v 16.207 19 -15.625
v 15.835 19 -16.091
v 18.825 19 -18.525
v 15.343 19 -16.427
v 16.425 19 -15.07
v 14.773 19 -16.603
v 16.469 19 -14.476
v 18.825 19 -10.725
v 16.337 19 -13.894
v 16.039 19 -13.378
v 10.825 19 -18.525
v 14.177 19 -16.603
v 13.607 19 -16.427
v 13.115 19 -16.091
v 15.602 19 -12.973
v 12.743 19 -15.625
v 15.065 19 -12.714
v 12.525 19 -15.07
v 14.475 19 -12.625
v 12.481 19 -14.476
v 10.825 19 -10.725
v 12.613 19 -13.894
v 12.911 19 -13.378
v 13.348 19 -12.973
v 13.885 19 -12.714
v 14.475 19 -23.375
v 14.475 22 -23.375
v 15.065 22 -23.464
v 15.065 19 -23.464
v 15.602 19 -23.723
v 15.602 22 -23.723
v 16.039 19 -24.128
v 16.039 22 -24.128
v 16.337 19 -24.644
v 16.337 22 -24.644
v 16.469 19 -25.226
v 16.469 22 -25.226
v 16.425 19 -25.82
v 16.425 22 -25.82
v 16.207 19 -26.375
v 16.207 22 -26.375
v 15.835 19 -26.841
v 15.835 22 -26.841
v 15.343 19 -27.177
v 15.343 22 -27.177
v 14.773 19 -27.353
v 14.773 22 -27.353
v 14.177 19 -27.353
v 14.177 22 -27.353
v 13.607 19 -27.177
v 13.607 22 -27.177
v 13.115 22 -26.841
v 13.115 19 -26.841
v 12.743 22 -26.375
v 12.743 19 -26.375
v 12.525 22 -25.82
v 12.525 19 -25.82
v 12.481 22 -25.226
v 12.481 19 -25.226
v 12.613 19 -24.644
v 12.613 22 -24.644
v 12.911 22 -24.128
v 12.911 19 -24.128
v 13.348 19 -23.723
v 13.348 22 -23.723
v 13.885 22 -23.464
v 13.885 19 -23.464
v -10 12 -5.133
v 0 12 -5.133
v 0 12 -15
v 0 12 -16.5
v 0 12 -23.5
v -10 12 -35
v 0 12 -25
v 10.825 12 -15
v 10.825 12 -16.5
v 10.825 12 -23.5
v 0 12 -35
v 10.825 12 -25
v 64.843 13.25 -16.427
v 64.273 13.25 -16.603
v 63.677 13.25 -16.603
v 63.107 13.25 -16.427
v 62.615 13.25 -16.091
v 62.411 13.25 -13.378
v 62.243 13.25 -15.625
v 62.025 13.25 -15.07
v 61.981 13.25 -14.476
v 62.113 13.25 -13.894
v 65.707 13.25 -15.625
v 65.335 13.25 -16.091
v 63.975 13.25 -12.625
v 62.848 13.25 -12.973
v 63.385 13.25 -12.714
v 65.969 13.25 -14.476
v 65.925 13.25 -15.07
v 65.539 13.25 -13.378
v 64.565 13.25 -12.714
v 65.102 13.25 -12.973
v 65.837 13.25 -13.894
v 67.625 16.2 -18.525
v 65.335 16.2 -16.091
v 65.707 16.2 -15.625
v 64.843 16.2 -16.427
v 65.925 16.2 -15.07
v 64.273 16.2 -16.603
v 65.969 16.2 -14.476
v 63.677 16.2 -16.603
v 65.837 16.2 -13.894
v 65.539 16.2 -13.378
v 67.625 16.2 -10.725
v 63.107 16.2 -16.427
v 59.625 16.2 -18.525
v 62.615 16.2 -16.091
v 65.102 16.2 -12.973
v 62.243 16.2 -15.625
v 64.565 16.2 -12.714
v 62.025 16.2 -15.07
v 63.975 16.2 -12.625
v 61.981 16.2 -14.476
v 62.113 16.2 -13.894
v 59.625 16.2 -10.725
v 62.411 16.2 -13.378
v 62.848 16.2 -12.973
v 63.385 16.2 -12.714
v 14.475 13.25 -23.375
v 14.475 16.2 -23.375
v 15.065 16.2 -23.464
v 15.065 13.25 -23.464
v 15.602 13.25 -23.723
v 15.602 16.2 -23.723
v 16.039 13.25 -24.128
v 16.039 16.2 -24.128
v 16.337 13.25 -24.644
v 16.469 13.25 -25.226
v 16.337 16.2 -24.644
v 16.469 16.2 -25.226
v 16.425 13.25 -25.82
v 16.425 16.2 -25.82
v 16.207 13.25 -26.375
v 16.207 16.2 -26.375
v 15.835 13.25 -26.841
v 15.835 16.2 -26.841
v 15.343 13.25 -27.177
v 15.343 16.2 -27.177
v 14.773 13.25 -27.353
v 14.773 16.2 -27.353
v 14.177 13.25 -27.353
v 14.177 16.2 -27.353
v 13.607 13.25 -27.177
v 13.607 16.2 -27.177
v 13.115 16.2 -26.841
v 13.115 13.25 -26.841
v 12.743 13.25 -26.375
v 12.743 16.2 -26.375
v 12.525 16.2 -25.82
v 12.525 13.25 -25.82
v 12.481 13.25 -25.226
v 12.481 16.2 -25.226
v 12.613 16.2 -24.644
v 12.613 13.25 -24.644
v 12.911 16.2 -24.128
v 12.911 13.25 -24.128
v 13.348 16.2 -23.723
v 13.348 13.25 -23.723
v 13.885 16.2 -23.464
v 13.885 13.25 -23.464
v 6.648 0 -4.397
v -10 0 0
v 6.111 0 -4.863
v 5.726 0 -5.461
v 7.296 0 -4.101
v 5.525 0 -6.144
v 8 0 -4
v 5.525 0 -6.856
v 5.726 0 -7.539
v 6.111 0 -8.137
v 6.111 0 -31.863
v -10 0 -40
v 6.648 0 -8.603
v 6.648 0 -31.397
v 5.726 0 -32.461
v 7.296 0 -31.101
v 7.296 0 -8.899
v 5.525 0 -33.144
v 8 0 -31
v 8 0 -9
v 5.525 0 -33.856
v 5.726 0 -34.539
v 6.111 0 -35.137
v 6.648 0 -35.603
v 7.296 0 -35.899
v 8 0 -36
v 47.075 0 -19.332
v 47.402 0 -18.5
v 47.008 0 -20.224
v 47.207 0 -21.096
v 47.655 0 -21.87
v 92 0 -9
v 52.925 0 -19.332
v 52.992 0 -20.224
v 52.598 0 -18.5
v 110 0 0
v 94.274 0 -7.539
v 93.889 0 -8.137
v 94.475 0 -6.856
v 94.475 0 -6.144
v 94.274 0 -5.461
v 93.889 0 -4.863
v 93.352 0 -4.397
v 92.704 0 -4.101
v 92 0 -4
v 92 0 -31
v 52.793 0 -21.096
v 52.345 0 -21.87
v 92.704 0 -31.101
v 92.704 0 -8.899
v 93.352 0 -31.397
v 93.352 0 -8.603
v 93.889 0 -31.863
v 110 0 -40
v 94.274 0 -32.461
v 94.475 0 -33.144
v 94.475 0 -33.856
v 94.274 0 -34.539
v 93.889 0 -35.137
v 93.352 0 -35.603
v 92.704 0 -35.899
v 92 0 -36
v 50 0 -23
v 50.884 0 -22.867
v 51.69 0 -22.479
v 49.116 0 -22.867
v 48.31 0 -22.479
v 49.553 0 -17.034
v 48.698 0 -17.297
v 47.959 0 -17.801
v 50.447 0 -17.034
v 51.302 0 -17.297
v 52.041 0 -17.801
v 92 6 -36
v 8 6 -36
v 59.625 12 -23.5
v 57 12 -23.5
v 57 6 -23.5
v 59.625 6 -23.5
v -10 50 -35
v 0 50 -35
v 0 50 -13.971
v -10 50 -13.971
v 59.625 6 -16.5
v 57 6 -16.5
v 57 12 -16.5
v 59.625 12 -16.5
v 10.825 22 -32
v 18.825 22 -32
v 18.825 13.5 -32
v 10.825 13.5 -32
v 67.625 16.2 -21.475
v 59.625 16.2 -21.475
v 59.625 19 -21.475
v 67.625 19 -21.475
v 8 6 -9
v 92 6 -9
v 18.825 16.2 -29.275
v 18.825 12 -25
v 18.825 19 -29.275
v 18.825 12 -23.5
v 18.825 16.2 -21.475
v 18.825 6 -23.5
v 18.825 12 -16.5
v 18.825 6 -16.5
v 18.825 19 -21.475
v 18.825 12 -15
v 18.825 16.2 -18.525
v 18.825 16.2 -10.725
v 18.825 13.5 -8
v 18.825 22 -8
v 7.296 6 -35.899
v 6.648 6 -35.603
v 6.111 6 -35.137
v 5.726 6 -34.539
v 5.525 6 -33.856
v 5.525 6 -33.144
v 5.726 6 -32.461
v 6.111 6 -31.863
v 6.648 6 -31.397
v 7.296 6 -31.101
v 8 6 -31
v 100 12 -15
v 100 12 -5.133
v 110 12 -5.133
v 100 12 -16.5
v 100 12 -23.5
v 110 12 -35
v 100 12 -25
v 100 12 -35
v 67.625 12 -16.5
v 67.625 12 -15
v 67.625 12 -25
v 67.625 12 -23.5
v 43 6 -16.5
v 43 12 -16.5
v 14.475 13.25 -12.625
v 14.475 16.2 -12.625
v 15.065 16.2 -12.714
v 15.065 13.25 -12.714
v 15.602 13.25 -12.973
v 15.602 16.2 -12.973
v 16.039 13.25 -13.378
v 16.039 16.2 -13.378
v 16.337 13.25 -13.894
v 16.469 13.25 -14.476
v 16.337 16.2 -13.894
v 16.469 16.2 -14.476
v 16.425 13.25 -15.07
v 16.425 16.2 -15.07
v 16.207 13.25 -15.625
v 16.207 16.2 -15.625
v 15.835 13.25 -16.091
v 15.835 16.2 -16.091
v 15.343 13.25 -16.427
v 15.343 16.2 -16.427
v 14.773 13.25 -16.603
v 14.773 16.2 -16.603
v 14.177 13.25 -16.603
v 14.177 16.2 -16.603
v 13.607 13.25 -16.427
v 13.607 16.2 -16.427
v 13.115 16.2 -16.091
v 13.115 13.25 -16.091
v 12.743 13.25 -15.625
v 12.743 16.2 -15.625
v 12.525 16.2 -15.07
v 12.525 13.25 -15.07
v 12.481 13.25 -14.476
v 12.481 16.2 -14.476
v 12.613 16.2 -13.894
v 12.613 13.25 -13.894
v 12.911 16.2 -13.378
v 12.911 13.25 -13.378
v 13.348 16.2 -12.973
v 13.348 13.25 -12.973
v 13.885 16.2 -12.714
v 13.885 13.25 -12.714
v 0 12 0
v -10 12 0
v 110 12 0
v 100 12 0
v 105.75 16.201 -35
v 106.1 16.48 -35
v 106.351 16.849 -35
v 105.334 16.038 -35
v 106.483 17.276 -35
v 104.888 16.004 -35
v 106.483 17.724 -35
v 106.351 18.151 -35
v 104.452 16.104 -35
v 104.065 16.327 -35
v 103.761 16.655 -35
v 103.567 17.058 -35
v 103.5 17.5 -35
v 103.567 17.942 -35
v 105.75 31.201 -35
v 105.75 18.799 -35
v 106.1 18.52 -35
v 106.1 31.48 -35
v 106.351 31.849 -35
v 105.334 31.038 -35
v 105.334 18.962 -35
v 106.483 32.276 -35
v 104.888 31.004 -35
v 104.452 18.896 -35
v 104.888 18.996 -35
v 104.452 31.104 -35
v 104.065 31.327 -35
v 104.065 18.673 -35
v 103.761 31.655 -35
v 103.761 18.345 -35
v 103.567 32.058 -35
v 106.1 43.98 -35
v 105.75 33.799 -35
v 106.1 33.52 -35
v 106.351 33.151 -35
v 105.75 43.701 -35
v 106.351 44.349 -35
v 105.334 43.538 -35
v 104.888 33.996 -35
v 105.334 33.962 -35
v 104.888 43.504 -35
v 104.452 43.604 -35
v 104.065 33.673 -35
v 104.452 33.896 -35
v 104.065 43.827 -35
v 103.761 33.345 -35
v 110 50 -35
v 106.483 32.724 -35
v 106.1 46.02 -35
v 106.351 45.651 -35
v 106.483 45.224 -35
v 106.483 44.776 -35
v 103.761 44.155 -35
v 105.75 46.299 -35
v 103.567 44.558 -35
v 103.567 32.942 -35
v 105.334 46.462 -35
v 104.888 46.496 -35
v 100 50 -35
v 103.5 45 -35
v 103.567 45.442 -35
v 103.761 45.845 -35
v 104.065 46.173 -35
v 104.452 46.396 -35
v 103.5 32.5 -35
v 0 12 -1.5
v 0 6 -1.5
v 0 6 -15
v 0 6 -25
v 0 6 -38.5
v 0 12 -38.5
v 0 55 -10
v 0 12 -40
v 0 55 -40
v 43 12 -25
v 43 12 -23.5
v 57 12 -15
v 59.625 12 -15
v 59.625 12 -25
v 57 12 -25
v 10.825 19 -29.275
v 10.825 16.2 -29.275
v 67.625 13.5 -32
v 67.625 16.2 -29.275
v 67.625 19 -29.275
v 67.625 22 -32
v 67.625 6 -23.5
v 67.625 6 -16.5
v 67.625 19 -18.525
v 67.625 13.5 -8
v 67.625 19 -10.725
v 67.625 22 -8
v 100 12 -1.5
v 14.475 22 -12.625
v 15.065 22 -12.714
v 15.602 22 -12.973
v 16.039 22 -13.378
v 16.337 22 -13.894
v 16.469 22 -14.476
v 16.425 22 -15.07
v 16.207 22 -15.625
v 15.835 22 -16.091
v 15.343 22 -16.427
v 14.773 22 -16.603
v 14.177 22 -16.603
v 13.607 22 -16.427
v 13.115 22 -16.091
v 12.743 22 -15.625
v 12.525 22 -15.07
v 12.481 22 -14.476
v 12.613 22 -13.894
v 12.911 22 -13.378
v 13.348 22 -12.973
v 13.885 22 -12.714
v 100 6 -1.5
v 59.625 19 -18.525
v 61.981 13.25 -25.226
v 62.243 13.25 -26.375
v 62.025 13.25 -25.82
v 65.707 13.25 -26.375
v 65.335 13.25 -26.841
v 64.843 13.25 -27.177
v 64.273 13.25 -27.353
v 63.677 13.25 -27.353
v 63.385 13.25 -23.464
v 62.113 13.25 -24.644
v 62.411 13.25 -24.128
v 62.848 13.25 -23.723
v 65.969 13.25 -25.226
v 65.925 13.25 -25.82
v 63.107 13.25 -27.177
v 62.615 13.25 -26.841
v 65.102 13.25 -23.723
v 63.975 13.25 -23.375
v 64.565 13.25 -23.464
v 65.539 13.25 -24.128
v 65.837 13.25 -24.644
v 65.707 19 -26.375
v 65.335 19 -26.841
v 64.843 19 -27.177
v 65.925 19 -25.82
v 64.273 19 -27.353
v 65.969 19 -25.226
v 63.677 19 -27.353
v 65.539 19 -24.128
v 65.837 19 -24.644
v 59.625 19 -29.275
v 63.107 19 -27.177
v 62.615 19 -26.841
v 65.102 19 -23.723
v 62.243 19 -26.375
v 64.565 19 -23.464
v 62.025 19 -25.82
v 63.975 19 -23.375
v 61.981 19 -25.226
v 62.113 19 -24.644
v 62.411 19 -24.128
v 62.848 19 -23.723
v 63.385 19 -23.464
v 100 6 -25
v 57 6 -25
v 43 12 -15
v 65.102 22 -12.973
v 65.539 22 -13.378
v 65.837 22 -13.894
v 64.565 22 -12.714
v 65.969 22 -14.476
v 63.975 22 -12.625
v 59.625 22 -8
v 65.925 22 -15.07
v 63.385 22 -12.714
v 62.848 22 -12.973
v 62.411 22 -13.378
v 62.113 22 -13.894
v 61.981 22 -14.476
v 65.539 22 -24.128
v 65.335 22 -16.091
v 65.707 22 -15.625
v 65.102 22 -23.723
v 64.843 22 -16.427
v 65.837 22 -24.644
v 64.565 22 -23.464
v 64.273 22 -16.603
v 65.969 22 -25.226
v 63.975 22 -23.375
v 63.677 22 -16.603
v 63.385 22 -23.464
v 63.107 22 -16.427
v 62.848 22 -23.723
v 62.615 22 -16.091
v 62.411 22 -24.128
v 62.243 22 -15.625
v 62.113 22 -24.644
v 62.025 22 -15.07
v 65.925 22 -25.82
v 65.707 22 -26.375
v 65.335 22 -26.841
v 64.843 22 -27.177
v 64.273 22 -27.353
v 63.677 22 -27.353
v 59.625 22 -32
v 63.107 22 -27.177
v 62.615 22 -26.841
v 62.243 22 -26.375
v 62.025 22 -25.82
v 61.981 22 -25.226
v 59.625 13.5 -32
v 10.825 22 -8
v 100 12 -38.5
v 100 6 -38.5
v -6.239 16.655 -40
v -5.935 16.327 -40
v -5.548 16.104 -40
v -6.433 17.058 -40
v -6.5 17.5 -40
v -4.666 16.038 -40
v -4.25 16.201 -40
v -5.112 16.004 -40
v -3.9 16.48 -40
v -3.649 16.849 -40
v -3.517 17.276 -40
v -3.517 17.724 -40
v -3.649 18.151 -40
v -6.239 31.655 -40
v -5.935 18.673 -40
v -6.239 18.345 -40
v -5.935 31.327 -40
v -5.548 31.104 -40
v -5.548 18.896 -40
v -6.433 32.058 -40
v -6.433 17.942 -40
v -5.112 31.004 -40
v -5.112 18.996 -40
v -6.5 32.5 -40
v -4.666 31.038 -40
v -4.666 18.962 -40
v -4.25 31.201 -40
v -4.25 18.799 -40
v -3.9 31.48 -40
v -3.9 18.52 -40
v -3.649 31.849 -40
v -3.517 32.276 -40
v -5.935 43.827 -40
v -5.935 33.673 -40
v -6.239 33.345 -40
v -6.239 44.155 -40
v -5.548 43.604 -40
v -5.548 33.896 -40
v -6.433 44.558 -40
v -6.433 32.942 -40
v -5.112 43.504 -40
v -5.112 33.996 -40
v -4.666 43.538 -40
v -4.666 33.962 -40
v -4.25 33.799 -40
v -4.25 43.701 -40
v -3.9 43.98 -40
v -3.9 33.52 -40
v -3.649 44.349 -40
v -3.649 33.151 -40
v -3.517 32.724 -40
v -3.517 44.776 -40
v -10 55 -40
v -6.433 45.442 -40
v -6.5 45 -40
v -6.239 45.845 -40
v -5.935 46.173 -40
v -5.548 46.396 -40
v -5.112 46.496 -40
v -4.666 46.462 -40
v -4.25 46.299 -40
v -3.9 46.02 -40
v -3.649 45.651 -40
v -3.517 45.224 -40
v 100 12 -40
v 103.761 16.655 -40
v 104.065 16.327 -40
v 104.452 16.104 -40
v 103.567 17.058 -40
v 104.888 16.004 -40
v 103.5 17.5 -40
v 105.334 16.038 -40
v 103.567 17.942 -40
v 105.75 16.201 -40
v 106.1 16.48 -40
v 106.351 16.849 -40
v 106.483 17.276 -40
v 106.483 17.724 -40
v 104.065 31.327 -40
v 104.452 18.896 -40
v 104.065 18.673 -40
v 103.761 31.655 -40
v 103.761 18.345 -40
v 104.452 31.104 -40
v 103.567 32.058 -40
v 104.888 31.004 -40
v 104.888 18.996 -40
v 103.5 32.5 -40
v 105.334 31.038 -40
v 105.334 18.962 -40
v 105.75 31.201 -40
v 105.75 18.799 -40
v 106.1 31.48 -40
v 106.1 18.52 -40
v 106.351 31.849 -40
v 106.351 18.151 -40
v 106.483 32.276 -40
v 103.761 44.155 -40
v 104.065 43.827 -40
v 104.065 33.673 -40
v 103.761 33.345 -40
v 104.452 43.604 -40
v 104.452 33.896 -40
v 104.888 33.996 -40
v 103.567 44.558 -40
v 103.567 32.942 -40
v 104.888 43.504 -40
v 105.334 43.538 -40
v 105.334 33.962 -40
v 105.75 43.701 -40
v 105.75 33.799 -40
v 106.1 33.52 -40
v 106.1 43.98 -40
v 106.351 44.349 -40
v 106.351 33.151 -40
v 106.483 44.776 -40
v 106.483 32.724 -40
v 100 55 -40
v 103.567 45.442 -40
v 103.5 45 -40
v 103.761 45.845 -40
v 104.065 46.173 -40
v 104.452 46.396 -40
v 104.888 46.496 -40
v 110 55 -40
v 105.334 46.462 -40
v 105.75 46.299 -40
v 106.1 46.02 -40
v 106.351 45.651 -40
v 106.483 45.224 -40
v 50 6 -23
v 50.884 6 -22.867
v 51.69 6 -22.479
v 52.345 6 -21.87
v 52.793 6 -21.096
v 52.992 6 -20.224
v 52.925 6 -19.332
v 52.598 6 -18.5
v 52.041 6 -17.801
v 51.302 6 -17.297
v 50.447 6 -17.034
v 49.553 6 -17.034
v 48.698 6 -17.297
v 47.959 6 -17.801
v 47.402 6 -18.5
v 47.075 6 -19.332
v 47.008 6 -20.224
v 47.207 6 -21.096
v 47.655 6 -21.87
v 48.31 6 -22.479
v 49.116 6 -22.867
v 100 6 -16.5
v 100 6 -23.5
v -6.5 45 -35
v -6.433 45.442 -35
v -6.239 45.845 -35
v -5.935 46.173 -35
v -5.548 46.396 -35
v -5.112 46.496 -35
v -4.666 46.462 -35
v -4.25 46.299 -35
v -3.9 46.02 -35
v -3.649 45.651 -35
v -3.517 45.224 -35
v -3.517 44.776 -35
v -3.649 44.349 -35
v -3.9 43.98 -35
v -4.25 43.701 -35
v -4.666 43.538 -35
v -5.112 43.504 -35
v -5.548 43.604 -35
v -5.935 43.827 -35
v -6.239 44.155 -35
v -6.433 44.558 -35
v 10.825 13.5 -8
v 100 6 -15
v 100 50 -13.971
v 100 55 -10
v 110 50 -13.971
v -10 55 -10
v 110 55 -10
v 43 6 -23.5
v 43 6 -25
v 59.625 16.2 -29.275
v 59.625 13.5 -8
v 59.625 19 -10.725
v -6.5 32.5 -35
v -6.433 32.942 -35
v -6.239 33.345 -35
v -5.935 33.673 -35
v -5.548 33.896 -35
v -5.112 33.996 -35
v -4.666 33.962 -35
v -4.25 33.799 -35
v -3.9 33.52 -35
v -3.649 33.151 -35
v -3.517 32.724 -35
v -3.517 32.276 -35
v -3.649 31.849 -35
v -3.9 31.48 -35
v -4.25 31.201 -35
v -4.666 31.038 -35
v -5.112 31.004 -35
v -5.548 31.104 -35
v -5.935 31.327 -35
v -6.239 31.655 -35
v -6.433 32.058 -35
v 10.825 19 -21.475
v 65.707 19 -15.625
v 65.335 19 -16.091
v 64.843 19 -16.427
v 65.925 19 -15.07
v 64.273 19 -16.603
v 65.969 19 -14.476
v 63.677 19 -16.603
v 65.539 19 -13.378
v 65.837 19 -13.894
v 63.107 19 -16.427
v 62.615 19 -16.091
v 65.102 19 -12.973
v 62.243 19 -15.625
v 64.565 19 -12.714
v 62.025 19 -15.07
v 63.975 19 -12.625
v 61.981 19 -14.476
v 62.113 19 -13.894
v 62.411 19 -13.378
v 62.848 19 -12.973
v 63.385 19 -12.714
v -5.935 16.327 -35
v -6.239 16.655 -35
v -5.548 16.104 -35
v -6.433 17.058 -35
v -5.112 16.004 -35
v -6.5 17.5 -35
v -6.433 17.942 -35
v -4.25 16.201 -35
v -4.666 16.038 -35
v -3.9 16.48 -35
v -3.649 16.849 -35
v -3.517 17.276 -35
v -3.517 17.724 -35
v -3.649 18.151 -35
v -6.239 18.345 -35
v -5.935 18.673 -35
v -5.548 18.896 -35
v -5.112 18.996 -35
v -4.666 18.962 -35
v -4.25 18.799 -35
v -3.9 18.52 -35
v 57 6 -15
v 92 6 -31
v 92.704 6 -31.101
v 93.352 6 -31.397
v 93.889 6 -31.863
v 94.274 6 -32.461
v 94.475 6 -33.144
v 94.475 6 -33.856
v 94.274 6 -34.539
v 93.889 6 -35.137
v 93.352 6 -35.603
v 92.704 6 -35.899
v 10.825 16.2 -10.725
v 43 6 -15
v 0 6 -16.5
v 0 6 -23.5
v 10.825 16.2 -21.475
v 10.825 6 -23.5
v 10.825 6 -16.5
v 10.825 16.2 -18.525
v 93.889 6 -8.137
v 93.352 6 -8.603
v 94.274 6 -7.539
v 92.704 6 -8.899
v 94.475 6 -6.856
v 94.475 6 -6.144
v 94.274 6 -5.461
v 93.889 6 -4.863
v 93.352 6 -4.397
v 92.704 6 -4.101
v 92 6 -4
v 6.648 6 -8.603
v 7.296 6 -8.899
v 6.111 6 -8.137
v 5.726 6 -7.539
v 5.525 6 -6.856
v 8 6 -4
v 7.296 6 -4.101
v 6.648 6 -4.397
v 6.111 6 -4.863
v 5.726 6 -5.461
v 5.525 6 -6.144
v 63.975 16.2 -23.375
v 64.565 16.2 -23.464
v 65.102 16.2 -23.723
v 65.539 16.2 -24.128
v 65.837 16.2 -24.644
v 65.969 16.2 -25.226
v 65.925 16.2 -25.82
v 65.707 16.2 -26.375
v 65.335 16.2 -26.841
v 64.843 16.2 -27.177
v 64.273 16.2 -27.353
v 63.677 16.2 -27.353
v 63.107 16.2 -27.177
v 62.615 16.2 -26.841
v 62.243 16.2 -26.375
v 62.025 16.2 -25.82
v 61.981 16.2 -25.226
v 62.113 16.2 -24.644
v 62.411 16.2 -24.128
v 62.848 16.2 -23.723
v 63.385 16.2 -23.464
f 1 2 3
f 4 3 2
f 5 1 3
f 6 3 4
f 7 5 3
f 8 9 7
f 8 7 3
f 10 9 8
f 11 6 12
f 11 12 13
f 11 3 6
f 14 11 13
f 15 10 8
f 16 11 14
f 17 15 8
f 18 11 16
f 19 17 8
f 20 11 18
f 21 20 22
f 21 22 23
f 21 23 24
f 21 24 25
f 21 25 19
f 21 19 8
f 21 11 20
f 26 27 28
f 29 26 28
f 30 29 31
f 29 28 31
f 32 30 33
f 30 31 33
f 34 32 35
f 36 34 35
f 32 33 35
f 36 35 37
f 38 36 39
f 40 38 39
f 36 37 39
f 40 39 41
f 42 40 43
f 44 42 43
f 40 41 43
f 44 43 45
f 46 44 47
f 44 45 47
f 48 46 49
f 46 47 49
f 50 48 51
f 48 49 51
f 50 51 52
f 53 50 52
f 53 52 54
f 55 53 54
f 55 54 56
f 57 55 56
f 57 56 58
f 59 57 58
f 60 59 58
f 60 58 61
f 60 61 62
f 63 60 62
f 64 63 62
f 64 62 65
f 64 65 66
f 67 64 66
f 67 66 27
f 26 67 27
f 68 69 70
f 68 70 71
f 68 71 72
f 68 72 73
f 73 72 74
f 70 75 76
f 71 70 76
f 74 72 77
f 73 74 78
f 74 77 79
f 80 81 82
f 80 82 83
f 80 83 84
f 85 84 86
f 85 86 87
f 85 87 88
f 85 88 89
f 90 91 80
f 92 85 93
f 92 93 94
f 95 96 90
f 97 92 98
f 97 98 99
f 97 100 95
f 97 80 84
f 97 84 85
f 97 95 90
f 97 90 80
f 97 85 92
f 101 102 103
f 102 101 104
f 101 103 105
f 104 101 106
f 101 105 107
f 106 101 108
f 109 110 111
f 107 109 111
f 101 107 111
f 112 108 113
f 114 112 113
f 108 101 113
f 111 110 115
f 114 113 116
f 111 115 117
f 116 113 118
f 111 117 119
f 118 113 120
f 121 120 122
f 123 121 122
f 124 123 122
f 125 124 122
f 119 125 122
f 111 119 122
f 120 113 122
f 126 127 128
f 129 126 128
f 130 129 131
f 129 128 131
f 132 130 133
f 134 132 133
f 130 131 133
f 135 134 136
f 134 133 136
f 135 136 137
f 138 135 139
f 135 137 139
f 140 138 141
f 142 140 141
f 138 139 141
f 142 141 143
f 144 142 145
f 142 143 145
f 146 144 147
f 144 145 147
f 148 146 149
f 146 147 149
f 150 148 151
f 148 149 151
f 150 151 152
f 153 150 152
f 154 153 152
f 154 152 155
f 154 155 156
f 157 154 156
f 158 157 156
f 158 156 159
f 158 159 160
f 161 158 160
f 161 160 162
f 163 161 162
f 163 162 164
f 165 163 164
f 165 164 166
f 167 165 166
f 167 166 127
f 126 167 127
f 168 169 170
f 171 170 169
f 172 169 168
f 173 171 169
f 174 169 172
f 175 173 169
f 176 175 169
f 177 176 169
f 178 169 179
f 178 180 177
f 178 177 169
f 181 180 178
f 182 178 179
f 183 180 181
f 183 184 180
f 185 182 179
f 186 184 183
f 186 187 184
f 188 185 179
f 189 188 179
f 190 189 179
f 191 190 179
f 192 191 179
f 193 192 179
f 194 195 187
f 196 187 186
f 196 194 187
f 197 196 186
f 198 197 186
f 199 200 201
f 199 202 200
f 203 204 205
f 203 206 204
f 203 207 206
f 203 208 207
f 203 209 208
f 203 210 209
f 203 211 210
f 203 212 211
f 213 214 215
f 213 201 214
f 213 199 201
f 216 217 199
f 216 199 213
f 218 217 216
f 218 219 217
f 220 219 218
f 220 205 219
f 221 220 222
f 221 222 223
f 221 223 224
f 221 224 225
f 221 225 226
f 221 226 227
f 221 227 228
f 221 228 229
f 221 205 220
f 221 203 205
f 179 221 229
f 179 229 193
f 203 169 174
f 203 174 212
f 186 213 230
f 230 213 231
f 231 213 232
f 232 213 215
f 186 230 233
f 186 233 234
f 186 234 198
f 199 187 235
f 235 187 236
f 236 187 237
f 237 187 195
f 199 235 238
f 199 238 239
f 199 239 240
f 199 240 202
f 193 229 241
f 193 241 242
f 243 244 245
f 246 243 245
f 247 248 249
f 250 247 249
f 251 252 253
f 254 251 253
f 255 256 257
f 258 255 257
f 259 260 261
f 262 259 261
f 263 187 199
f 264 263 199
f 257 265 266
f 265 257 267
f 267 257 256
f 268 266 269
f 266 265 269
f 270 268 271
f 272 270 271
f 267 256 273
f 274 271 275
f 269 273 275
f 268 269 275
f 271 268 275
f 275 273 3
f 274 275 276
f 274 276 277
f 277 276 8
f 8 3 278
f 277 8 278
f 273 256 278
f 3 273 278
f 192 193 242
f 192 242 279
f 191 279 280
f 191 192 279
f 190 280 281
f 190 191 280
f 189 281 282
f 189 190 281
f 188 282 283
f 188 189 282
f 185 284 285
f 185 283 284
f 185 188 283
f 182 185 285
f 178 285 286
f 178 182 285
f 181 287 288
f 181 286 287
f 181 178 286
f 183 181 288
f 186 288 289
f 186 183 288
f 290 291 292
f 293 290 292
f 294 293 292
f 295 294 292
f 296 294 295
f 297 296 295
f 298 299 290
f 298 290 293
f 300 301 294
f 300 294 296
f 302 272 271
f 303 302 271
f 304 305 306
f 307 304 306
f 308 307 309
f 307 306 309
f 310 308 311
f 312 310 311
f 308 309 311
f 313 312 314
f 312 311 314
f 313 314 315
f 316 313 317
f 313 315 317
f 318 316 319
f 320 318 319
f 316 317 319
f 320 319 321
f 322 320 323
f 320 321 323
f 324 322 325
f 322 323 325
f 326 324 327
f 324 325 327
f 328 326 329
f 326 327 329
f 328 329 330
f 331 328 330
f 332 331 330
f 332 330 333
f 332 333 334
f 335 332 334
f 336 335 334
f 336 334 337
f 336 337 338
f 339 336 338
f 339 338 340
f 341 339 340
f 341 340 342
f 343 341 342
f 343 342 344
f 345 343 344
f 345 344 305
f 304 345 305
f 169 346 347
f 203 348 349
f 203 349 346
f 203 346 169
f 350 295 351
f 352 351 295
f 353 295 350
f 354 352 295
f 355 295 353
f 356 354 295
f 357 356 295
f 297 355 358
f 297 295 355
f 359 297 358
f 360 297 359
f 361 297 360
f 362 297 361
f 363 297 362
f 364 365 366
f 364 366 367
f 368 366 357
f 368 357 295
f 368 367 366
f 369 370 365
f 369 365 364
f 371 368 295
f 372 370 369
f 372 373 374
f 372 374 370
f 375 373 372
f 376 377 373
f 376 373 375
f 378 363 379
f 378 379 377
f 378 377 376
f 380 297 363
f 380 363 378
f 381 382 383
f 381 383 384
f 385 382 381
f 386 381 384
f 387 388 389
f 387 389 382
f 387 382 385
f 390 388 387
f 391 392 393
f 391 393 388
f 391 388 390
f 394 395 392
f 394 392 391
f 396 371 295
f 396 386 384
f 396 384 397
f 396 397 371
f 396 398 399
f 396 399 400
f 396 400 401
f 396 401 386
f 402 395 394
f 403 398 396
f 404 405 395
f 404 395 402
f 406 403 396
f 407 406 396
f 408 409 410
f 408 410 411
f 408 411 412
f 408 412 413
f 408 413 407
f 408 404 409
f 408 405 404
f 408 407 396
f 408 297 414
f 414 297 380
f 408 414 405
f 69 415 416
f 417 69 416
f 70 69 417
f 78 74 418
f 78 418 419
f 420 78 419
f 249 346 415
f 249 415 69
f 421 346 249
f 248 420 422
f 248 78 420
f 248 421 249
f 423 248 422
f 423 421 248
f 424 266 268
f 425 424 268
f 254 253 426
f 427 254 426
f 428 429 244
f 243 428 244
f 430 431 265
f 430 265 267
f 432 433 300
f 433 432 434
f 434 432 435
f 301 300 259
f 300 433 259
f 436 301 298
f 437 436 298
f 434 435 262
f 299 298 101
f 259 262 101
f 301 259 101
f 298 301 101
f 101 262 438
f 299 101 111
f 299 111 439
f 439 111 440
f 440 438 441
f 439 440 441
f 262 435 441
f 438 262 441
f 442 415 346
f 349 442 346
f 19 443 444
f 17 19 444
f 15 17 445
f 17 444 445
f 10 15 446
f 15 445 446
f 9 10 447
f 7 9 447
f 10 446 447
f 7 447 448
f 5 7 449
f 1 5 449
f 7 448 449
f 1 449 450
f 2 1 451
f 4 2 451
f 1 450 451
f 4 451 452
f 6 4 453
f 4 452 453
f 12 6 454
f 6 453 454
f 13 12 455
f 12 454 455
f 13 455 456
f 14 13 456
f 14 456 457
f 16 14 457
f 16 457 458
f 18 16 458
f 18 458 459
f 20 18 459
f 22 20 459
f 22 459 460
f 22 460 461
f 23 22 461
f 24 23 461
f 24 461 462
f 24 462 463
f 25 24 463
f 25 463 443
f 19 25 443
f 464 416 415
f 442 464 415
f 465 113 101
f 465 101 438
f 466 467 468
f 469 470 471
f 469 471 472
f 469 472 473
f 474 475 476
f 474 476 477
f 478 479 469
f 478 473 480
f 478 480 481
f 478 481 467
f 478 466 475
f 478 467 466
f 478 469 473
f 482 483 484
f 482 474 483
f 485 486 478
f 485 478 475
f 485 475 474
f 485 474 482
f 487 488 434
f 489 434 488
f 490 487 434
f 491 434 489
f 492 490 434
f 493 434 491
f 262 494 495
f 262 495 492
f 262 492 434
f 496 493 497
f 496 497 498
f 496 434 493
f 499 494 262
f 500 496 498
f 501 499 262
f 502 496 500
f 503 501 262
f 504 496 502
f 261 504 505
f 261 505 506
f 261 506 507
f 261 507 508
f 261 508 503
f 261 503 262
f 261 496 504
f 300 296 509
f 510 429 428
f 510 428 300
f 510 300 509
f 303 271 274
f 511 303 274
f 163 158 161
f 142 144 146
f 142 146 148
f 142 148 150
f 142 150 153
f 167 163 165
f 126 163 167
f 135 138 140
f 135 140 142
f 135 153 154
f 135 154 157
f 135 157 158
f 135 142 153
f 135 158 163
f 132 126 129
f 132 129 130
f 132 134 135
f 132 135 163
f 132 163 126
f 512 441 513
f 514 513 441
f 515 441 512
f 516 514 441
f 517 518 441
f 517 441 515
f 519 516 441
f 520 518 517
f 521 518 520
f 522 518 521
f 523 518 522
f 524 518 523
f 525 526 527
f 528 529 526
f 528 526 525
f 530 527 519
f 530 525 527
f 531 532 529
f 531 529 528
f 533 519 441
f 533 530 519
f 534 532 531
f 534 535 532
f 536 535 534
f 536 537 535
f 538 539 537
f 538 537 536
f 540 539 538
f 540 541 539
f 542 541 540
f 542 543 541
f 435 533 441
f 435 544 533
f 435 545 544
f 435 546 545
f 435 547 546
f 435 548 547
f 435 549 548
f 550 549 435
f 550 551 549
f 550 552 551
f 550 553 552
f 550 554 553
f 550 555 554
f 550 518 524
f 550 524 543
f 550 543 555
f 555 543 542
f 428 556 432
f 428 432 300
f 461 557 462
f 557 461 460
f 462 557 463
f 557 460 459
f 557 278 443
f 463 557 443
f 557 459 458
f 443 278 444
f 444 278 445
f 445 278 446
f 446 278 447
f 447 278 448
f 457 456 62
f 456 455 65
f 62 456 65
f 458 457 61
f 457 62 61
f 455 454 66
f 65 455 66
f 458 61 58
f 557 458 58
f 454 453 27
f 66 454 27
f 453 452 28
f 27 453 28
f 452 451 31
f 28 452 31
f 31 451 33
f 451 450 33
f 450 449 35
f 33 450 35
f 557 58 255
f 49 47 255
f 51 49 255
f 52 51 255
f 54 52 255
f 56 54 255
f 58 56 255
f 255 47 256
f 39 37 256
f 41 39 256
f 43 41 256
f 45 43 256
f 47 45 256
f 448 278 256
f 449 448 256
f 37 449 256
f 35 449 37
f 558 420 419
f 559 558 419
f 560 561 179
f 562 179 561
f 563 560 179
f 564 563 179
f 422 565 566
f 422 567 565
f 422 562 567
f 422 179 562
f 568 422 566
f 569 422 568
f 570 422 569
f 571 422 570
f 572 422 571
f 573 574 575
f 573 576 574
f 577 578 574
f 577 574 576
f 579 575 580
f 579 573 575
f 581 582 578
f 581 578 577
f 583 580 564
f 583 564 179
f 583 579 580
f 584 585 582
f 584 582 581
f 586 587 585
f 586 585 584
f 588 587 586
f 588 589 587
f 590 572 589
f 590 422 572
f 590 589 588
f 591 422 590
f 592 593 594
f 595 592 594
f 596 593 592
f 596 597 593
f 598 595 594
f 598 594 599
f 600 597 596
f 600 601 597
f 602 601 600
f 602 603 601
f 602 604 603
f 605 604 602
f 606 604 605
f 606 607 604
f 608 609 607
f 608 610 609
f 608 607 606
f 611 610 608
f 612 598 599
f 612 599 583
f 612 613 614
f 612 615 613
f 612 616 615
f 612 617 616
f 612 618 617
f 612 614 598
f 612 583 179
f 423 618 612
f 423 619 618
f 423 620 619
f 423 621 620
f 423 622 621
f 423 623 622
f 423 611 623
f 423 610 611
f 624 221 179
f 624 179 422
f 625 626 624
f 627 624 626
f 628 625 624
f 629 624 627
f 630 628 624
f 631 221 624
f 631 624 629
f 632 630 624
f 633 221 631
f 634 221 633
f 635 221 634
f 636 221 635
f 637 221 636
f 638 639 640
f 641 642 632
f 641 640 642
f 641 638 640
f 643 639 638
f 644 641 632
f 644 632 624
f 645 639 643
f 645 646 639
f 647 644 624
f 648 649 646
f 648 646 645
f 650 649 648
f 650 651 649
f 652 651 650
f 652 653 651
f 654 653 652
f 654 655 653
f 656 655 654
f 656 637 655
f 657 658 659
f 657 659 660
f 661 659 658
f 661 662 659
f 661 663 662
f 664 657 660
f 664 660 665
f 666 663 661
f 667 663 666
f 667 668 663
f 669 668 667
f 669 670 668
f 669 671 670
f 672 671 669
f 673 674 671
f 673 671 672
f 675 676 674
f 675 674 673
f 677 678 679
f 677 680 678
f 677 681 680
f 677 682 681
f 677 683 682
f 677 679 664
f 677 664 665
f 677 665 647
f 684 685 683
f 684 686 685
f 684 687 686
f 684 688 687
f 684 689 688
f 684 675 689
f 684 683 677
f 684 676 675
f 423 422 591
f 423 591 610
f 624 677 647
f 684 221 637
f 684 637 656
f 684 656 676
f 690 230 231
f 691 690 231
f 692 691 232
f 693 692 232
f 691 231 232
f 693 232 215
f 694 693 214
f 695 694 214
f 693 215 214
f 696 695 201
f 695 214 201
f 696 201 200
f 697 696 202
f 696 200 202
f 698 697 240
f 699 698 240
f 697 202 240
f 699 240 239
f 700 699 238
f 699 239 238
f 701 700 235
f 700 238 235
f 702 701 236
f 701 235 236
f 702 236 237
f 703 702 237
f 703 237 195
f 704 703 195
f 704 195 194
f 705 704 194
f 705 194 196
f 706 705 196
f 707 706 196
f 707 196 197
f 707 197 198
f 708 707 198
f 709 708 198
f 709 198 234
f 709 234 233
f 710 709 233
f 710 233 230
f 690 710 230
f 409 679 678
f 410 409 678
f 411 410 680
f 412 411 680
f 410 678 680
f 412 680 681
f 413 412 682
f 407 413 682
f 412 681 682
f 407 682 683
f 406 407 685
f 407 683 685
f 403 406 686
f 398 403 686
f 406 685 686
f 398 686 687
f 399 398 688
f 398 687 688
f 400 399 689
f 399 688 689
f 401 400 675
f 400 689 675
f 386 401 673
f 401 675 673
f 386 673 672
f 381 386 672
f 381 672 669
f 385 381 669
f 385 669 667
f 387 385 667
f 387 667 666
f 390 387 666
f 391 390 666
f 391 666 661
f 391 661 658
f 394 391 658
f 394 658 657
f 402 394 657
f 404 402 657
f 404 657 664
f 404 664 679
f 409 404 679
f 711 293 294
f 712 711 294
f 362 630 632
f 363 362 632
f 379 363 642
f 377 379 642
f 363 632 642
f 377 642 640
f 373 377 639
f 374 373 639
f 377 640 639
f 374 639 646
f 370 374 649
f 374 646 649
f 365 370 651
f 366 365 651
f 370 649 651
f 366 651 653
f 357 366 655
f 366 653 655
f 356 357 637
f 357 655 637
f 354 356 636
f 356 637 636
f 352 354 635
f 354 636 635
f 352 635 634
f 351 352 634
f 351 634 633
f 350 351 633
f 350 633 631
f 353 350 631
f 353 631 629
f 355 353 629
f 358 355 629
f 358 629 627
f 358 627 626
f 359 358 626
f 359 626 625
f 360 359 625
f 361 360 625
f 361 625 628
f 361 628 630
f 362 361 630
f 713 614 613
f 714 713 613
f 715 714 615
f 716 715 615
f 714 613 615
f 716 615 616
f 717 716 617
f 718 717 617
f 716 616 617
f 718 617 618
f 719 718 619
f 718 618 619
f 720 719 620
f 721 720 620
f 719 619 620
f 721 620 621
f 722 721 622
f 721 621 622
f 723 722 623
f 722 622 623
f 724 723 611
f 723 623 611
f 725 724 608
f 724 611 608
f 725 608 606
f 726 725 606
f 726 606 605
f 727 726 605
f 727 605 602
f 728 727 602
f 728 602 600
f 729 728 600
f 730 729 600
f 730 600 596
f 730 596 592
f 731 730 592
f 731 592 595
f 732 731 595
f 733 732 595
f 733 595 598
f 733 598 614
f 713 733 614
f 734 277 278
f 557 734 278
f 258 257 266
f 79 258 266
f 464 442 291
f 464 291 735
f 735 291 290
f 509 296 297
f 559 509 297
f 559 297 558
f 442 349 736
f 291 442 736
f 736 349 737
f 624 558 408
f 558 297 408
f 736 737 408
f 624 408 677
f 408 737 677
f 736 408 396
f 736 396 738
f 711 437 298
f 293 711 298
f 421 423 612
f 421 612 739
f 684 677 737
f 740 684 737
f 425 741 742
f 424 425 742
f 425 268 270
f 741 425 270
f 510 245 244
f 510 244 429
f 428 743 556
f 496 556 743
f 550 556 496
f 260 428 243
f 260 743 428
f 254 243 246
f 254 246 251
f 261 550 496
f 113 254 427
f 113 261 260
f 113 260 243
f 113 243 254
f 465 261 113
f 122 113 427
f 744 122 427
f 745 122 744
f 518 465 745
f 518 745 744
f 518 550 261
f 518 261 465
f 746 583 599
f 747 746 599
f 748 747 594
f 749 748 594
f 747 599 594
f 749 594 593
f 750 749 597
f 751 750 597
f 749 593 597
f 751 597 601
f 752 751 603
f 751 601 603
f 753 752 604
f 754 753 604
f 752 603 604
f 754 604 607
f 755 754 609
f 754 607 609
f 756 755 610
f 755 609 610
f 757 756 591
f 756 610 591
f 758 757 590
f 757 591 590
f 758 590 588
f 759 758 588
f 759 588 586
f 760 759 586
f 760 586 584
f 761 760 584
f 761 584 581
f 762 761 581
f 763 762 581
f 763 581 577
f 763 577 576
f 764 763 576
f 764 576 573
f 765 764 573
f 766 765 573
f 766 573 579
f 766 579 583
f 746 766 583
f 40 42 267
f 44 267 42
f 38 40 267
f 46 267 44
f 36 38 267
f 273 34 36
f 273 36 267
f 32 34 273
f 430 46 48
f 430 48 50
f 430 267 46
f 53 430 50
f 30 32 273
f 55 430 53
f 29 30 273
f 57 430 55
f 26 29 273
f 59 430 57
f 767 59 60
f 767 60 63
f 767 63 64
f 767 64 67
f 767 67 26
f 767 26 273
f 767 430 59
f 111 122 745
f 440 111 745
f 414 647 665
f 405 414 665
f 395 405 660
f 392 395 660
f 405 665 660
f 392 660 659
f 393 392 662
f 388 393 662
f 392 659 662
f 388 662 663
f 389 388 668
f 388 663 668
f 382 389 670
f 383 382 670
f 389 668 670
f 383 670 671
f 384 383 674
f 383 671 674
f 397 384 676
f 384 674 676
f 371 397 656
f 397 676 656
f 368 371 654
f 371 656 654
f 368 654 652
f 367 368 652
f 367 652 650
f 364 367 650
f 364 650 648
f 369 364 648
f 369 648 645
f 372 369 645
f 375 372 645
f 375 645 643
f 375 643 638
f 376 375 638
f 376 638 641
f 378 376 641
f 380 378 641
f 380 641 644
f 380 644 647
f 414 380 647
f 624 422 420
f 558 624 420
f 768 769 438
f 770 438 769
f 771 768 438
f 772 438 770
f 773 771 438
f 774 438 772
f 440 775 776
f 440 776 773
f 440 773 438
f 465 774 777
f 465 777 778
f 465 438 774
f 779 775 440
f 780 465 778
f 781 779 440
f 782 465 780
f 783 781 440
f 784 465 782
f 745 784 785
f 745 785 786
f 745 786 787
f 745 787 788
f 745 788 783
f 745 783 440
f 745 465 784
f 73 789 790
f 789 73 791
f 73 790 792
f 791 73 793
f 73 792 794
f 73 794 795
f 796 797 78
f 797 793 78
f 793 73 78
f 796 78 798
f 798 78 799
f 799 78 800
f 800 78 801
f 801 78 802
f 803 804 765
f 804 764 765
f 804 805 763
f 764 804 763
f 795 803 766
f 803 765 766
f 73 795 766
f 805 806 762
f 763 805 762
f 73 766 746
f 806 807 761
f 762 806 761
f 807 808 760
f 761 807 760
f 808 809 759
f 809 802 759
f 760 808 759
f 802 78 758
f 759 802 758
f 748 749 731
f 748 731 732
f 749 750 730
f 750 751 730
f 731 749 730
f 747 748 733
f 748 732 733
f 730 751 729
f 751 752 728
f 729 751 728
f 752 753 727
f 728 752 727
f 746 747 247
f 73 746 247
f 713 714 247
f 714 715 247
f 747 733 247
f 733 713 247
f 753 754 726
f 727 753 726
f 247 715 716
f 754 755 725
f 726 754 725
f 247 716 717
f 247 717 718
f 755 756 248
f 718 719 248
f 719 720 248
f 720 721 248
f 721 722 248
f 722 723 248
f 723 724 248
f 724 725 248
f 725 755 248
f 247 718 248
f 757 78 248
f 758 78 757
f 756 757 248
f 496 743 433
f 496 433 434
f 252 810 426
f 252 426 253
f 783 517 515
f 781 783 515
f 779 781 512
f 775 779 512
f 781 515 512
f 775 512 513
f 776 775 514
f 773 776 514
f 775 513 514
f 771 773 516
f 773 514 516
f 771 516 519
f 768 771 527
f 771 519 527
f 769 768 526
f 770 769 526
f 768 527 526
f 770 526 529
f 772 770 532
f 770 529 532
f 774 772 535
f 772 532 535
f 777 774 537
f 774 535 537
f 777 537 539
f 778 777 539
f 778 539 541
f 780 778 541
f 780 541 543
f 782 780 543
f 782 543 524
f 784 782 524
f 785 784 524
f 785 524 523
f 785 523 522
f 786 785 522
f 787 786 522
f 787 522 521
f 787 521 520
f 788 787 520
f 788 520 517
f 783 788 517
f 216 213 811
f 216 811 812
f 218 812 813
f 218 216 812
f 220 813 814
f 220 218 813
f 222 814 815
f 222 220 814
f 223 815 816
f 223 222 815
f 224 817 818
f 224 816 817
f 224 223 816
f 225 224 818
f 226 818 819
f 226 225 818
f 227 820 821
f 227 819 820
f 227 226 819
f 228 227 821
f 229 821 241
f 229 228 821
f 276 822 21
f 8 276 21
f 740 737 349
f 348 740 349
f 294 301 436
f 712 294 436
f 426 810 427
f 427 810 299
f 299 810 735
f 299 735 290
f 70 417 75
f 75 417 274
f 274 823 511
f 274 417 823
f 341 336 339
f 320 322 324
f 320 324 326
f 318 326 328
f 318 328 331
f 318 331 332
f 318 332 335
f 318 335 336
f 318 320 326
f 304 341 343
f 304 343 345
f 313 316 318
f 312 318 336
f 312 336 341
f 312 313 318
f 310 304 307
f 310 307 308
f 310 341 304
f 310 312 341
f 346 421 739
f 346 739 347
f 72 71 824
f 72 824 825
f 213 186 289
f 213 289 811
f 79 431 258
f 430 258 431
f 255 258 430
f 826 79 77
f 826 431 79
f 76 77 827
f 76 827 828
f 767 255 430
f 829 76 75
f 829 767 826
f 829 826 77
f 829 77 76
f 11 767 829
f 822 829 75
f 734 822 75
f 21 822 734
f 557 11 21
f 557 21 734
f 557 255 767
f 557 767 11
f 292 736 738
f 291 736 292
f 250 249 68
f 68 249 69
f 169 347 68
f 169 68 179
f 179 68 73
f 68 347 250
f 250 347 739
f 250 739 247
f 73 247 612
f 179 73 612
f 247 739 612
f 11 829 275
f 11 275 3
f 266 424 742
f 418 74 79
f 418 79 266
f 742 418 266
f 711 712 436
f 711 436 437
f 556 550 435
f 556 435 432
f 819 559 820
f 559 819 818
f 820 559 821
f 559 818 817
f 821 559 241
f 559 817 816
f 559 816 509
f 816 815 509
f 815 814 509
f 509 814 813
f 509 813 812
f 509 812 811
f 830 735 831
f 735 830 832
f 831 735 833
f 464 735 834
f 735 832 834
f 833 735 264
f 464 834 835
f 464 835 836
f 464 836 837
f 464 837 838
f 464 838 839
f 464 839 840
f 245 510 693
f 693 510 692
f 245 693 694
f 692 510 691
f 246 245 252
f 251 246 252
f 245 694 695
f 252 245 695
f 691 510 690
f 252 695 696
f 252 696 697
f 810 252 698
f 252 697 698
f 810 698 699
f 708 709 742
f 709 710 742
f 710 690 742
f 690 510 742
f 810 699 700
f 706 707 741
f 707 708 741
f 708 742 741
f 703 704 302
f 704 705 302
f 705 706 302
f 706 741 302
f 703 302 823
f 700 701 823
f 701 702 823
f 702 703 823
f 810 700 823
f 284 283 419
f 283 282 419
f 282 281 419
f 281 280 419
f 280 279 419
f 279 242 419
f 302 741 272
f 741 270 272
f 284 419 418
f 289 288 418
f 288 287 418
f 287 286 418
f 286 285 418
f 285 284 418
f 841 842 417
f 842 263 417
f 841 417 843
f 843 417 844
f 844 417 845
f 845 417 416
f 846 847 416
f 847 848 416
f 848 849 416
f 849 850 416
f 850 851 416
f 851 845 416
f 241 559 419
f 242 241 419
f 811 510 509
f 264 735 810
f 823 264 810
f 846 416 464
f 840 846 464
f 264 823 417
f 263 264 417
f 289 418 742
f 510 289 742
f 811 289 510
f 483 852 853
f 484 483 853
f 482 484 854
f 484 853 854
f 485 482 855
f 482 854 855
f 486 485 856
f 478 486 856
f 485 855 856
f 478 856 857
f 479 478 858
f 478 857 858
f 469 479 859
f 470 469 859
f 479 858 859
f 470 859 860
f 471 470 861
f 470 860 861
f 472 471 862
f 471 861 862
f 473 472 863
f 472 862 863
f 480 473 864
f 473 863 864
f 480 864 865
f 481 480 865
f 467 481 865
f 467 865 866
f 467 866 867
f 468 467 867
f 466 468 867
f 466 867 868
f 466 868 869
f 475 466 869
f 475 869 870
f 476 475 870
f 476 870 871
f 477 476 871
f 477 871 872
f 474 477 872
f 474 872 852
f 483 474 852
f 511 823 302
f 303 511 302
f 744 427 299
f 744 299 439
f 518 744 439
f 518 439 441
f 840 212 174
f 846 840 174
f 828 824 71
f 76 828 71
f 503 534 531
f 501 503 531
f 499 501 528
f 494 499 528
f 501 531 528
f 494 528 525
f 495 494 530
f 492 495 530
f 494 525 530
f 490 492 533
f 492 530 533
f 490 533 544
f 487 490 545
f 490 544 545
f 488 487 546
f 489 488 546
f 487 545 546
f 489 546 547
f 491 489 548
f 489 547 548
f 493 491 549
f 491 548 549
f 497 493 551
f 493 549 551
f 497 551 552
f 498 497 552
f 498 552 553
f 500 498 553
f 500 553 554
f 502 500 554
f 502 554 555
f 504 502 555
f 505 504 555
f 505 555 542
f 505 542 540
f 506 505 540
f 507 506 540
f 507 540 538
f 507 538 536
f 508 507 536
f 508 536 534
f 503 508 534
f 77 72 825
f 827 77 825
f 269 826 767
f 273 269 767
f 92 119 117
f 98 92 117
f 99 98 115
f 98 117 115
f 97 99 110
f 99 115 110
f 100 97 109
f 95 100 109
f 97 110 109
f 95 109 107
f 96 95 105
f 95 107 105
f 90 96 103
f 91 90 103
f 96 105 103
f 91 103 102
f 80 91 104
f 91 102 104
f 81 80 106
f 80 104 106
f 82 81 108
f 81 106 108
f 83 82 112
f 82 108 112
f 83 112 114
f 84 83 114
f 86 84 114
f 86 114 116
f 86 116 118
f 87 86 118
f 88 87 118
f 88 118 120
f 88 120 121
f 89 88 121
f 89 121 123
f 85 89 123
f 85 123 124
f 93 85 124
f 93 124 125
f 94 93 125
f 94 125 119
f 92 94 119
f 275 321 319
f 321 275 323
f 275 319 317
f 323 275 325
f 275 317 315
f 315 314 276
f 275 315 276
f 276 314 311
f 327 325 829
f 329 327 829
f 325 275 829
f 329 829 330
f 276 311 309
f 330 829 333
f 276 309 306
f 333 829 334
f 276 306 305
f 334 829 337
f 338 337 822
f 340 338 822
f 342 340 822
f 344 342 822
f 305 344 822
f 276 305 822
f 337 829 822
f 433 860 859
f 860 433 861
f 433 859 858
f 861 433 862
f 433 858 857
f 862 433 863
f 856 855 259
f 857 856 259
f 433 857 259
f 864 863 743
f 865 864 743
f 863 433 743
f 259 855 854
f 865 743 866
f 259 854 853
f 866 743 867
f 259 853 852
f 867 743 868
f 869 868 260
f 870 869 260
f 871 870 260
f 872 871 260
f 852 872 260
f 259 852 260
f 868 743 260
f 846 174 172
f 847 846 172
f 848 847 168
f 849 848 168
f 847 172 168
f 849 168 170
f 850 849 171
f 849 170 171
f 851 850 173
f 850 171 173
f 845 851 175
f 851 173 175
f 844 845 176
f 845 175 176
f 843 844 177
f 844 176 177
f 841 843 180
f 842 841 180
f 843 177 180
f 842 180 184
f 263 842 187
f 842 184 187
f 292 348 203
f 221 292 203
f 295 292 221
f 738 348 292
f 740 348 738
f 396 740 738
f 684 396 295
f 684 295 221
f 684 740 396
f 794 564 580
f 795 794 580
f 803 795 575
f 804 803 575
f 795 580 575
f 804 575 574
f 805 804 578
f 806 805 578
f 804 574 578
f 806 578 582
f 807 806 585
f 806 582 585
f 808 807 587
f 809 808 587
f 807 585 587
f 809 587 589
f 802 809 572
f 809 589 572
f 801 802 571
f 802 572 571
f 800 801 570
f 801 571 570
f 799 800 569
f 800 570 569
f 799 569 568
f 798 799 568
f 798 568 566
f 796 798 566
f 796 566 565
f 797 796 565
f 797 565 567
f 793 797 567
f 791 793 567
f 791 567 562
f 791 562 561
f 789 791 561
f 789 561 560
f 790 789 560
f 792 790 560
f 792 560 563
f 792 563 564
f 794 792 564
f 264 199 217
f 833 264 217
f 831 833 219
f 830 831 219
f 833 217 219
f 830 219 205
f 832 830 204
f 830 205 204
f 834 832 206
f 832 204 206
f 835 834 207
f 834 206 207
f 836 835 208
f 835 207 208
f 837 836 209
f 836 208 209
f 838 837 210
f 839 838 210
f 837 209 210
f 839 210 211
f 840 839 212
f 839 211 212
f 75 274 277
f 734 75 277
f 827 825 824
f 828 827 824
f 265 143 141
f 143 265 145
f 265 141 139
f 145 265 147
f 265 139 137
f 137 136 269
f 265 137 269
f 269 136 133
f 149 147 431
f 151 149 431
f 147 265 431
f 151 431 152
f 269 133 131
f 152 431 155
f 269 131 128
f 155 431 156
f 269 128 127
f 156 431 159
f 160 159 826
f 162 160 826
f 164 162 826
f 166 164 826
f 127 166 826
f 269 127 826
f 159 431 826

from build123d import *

# Parameters (mm, degrees)
BOSS_EXTRUDE1_DEPTH  = 100
BOSS_EXTRUDE2_DEPTH  = 8
BOSS_EXTRUDE3_DEPTH  = 8
SKETCH10_R           = 2
CUT_EXTRUDE4_DEPTH   = 8.75
SKETCH11_W           = 7.8
SKETCH11_H           = 2.8
CUT_EXTRUDE5_DEPTH   = 101.180739791
CUT_EXTRUDE1_REACH   = 111.927
SKETCH5_R            = 3
SKETCH6_W            = 14
SKETCH6_H            = 10
CUT_EXTRUDE2_DEPTH   = 6
BOSS_EXTRUDE4_DEPTH  = 10
BOSS_EXTRUDE11_DEPTH = 10
CUT_EXTRUDE3_REACH   = 131.325
SKETCH9_R            = 1.5


with BuildPart() as part:
    # Sketch1 → Boss-Extrude1 (new body)
    with BuildSketch(Plane(origin=(0, 0, 0), x_dir=(0, 0, -1), z_dir=(1, 0, 0))):
        Polygon((0, 0), (40, 0), (40, 12), (38.5, 12), (38.5, 6), (25, 6), (25, 12), (23.5, 12), (23.5, 6), (16.5, 6), (16.5, 12), (15, 12), (15, 6), (1.5, 6), (1.5, 12), (0, 12), align=None)
    extrude(amount=BOSS_EXTRUDE1_DEPTH)

    # Sketch2 → Boss-Extrude2 (add)
    with BuildSketch(Plane(origin=(18.825, 0, 0), x_dir=(0, 0, -1), z_dir=(1, 0, 0))):
        Polygon((15, 6), (15, 12), (8, 13.5), (8, 22), (32, 22), (32, 13.5), (25, 12), (25, 6), align=None)
    extrude(amount=-BOSS_EXTRUDE2_DEPTH)

    # Sketch4 → Boss-Extrude3 (add)
    with BuildSketch(Plane(origin=(59.625, 0, 0), x_dir=(0, 0, -1), z_dir=(1, 0, 0))):
        Polygon((25, 6), (15, 6), (15, 12), (8, 13.5), (8, 22), (32, 22), (32, 13.5), (25, 12), align=None)
    extrude(amount=BOSS_EXTRUDE3_DEPTH)

    # Sketch10 → Cut-Extrude4 (cut)
    with BuildSketch(Plane(origin=(0, 22, 0), x_dir=(1, 0, 0), z_dir=(0, 1, 0))):
        with Locations(Location((14.475, 14.625, 0), (0, 0, 270))):
            Circle(SKETCH10_R)
        with Locations(Location((14.475, 25.375, 0), (0, 0, 270))):
            Circle(SKETCH10_R)
        with Locations(Location((63.975, 14.625, 0), (0, 0, 270))):
            Circle(SKETCH10_R)
        with Locations(Location((63.975, 25.375, 0), (0, 0, 270))):
            Circle(SKETCH10_R)
    extrude(amount=-CUT_EXTRUDE4_DEPTH, mode=Mode.SUBTRACT)

    # Sketch11 → Cut-Extrude5 (cut, through all)
    with BuildSketch(Plane.ZY.offset(-10.825)):
        with Locations((-25.375, 17.6)):
            Rectangle(SKETCH11_W, SKETCH11_H)
        with Locations((-14.625, 17.6)):
            Rectangle(SKETCH11_W, SKETCH11_H)
    extrude(amount=-CUT_EXTRUDE5_DEPTH, mode=Mode.SUBTRACT)

    # Sketch5 → Cut-Extrude1 (cut, up to next)
    with BuildSketch(Plane.XZ, mode=Mode.PRIVATE) as cut_extrude1_sk1:
        with Locations(Location((50, -20, 0), (0, 0, 270))):
            Circle(SKETCH5_R)
    cut_extrude1_tool1 = extrude(cut_extrude1_sk1.sketch, amount=-CUT_EXTRUDE1_REACH, mode=Mode.PRIVATE) & part.part
    # Sketch5 → Cut-Extrude1 (cut, up to next)
    with BuildSketch(Plane.XZ, mode=Mode.PRIVATE) as cut_extrude1_sk2:
        with BuildLine():
            Line((8, -31), (92, -31))
            ThreePointArc((92, -31), (94.5, -33.5), (92, -36))
            Line((92, -36), (8, -36))
            ThreePointArc((8, -36), (5.5, -33.5), (8, -31))
        make_face()
    cut_extrude1_tool2 = extrude(cut_extrude1_sk2.sketch, amount=-CUT_EXTRUDE1_REACH, mode=Mode.PRIVATE) & part.part
    # Sketch5 → Cut-Extrude1 (cut, up to next)
    with BuildSketch(Plane.XZ, mode=Mode.PRIVATE) as cut_extrude1_sk3:
        with BuildLine():
            Line((92, -4), (8, -4))
            ThreePointArc((8, -4), (5.5, -6.5), (8, -9))
            Line((8, -9), (92, -9))
            ThreePointArc((92, -9), (94.5, -6.5), (92, -4))
        make_face()
    cut_extrude1_tool3 = extrude(cut_extrude1_sk3.sketch, amount=-CUT_EXTRUDE1_REACH, mode=Mode.PRIVATE) & part.part
    add(cut_extrude1_tool1.solids().sort_by_distance((50, 0, -20))[0], mode=Mode.SUBTRACT)
    add(cut_extrude1_tool2.solids().sort_by_distance((50, 0, -33.5))[0], mode=Mode.SUBTRACT)
    add(cut_extrude1_tool3.solids().sort_by_distance((50, 0, -6.5))[0], mode=Mode.SUBTRACT)

    # Sketch6 → Cut-Extrude2 (cut)
    with BuildSketch(Plane(origin=(0, 6, 0), x_dir=(1, 0, 0), z_dir=(0, 1, 0))):
        with Locations((50, 20)):
            Rectangle(SKETCH6_W, SKETCH6_H)
    extrude(amount=CUT_EXTRUDE2_DEPTH, mode=Mode.SUBTRACT)

    # Sketch7 → Boss-Extrude4 (add)
    with BuildSketch(Plane(origin=(100, 0, 0), x_dir=(0, 0, -1), z_dir=(1, 0, 0))):
        Polygon((0, 0), (40, 0), (40, 12), (40, 55), (10, 55), (0, 12), align=None)
        Polygon((35, 50), (13.970637222, 50), (5.13342792, 12), (35, 12), align=None, mode=Mode.SUBTRACT)
    extrude(amount=BOSS_EXTRUDE4_DEPTH)

    # Sketch8 → Boss-Extrude11 (add)
    with BuildSketch(Plane.ZY):
        Polygon((-40, 0), (-40, 55), (-10, 55), (0, 12), (0, 0), align=None)
        Polygon((-35, 50), (-13.970637222, 50), (-5.13342792, 12), (-35, 12), align=None, mode=Mode.SUBTRACT)
    extrude(amount=BOSS_EXTRUDE11_DEPTH)

    # Sketch9 → Cut-Extrude3 (cut, up to next)
    with BuildSketch(Plane(origin=(0, 0, -40), x_dir=(-1, 0, 0), z_dir=(0, 0, -1)), mode=Mode.PRIVATE) as cut_extrude3_sk1:
        with Locations((-105, 45)):
            Circle(SKETCH9_R)
    cut_extrude3_tool1 = extrude(cut_extrude3_sk1.sketch, amount=-CUT_EXTRUDE3_REACH, mode=Mode.PRIVATE) & part.part
    # Sketch9 → Cut-Extrude3 (cut, up to next)
    with BuildSketch(Plane(origin=(0, 0, -40), x_dir=(-1, 0, 0), z_dir=(0, 0, -1)), mode=Mode.PRIVATE) as cut_extrude3_sk2:
        with Locations((-105, 32.5)):
            Circle(SKETCH9_R)
    cut_extrude3_tool2 = extrude(cut_extrude3_sk2.sketch, amount=-CUT_EXTRUDE3_REACH, mode=Mode.PRIVATE) & part.part
    # Sketch9 → Cut-Extrude3 (cut, up to next)
    with BuildSketch(Plane(origin=(0, 0, -40), x_dir=(-1, 0, 0), z_dir=(0, 0, -1)), mode=Mode.PRIVATE) as cut_extrude3_sk3:
        with Locations((-105, 17.5)):
            Circle(SKETCH9_R)
    cut_extrude3_tool3 = extrude(cut_extrude3_sk3.sketch, amount=-CUT_EXTRUDE3_REACH, mode=Mode.PRIVATE) & part.part
    # Sketch9 → Cut-Extrude3 (cut, up to next)
    with BuildSketch(Plane(origin=(0, 0, -40), x_dir=(-1, 0, 0), z_dir=(0, 0, -1)), mode=Mode.PRIVATE) as cut_extrude3_sk4:
        with Locations((5, 45)):
            Circle(SKETCH9_R)
    cut_extrude3_tool4 = extrude(cut_extrude3_sk4.sketch, amount=-CUT_EXTRUDE3_REACH, mode=Mode.PRIVATE) & part.part
    # Sketch9 → Cut-Extrude3 (cut, up to next)
    with BuildSketch(Plane(origin=(0, 0, -40), x_dir=(-1, 0, 0), z_dir=(0, 0, -1)), mode=Mode.PRIVATE) as cut_extrude3_sk5:
        with Locations((5, 32.5)):
            Circle(SKETCH9_R)
    cut_extrude3_tool5 = extrude(cut_extrude3_sk5.sketch, amount=-CUT_EXTRUDE3_REACH, mode=Mode.PRIVATE) & part.part
    # Sketch9 → Cut-Extrude3 (cut, up to next)
    with BuildSketch(Plane(origin=(0, 0, -40), x_dir=(-1, 0, 0), z_dir=(0, 0, -1)), mode=Mode.PRIVATE) as cut_extrude3_sk6:
        with Locations((5, 17.5)):
            Circle(SKETCH9_R)
    cut_extrude3_tool6 = extrude(cut_extrude3_sk6.sketch, amount=-CUT_EXTRUDE3_REACH, mode=Mode.PRIVATE) & part.part
    add(cut_extrude3_tool1.solids().sort_by_distance((105, 45, -40))[0], mode=Mode.SUBTRACT)
    add(cut_extrude3_tool2.solids().sort_by_distance((105, 32.5, -40))[0], mode=Mode.SUBTRACT)
    add(cut_extrude3_tool3.solids().sort_by_distance((105, 17.5, -40))[0], mode=Mode.SUBTRACT)
    add(cut_extrude3_tool4.solids().sort_by_distance((-5, 45, -40))[0], mode=Mode.SUBTRACT)
    add(cut_extrude3_tool5.solids().sort_by_distance((-5, 32.5, -40))[0], mode=Mode.SUBTRACT)
    add(cut_extrude3_tool6.solids().sort_by_distance((-5, 17.5, -40))[0], mode=Mode.SUBTRACT)


solid = part.part
